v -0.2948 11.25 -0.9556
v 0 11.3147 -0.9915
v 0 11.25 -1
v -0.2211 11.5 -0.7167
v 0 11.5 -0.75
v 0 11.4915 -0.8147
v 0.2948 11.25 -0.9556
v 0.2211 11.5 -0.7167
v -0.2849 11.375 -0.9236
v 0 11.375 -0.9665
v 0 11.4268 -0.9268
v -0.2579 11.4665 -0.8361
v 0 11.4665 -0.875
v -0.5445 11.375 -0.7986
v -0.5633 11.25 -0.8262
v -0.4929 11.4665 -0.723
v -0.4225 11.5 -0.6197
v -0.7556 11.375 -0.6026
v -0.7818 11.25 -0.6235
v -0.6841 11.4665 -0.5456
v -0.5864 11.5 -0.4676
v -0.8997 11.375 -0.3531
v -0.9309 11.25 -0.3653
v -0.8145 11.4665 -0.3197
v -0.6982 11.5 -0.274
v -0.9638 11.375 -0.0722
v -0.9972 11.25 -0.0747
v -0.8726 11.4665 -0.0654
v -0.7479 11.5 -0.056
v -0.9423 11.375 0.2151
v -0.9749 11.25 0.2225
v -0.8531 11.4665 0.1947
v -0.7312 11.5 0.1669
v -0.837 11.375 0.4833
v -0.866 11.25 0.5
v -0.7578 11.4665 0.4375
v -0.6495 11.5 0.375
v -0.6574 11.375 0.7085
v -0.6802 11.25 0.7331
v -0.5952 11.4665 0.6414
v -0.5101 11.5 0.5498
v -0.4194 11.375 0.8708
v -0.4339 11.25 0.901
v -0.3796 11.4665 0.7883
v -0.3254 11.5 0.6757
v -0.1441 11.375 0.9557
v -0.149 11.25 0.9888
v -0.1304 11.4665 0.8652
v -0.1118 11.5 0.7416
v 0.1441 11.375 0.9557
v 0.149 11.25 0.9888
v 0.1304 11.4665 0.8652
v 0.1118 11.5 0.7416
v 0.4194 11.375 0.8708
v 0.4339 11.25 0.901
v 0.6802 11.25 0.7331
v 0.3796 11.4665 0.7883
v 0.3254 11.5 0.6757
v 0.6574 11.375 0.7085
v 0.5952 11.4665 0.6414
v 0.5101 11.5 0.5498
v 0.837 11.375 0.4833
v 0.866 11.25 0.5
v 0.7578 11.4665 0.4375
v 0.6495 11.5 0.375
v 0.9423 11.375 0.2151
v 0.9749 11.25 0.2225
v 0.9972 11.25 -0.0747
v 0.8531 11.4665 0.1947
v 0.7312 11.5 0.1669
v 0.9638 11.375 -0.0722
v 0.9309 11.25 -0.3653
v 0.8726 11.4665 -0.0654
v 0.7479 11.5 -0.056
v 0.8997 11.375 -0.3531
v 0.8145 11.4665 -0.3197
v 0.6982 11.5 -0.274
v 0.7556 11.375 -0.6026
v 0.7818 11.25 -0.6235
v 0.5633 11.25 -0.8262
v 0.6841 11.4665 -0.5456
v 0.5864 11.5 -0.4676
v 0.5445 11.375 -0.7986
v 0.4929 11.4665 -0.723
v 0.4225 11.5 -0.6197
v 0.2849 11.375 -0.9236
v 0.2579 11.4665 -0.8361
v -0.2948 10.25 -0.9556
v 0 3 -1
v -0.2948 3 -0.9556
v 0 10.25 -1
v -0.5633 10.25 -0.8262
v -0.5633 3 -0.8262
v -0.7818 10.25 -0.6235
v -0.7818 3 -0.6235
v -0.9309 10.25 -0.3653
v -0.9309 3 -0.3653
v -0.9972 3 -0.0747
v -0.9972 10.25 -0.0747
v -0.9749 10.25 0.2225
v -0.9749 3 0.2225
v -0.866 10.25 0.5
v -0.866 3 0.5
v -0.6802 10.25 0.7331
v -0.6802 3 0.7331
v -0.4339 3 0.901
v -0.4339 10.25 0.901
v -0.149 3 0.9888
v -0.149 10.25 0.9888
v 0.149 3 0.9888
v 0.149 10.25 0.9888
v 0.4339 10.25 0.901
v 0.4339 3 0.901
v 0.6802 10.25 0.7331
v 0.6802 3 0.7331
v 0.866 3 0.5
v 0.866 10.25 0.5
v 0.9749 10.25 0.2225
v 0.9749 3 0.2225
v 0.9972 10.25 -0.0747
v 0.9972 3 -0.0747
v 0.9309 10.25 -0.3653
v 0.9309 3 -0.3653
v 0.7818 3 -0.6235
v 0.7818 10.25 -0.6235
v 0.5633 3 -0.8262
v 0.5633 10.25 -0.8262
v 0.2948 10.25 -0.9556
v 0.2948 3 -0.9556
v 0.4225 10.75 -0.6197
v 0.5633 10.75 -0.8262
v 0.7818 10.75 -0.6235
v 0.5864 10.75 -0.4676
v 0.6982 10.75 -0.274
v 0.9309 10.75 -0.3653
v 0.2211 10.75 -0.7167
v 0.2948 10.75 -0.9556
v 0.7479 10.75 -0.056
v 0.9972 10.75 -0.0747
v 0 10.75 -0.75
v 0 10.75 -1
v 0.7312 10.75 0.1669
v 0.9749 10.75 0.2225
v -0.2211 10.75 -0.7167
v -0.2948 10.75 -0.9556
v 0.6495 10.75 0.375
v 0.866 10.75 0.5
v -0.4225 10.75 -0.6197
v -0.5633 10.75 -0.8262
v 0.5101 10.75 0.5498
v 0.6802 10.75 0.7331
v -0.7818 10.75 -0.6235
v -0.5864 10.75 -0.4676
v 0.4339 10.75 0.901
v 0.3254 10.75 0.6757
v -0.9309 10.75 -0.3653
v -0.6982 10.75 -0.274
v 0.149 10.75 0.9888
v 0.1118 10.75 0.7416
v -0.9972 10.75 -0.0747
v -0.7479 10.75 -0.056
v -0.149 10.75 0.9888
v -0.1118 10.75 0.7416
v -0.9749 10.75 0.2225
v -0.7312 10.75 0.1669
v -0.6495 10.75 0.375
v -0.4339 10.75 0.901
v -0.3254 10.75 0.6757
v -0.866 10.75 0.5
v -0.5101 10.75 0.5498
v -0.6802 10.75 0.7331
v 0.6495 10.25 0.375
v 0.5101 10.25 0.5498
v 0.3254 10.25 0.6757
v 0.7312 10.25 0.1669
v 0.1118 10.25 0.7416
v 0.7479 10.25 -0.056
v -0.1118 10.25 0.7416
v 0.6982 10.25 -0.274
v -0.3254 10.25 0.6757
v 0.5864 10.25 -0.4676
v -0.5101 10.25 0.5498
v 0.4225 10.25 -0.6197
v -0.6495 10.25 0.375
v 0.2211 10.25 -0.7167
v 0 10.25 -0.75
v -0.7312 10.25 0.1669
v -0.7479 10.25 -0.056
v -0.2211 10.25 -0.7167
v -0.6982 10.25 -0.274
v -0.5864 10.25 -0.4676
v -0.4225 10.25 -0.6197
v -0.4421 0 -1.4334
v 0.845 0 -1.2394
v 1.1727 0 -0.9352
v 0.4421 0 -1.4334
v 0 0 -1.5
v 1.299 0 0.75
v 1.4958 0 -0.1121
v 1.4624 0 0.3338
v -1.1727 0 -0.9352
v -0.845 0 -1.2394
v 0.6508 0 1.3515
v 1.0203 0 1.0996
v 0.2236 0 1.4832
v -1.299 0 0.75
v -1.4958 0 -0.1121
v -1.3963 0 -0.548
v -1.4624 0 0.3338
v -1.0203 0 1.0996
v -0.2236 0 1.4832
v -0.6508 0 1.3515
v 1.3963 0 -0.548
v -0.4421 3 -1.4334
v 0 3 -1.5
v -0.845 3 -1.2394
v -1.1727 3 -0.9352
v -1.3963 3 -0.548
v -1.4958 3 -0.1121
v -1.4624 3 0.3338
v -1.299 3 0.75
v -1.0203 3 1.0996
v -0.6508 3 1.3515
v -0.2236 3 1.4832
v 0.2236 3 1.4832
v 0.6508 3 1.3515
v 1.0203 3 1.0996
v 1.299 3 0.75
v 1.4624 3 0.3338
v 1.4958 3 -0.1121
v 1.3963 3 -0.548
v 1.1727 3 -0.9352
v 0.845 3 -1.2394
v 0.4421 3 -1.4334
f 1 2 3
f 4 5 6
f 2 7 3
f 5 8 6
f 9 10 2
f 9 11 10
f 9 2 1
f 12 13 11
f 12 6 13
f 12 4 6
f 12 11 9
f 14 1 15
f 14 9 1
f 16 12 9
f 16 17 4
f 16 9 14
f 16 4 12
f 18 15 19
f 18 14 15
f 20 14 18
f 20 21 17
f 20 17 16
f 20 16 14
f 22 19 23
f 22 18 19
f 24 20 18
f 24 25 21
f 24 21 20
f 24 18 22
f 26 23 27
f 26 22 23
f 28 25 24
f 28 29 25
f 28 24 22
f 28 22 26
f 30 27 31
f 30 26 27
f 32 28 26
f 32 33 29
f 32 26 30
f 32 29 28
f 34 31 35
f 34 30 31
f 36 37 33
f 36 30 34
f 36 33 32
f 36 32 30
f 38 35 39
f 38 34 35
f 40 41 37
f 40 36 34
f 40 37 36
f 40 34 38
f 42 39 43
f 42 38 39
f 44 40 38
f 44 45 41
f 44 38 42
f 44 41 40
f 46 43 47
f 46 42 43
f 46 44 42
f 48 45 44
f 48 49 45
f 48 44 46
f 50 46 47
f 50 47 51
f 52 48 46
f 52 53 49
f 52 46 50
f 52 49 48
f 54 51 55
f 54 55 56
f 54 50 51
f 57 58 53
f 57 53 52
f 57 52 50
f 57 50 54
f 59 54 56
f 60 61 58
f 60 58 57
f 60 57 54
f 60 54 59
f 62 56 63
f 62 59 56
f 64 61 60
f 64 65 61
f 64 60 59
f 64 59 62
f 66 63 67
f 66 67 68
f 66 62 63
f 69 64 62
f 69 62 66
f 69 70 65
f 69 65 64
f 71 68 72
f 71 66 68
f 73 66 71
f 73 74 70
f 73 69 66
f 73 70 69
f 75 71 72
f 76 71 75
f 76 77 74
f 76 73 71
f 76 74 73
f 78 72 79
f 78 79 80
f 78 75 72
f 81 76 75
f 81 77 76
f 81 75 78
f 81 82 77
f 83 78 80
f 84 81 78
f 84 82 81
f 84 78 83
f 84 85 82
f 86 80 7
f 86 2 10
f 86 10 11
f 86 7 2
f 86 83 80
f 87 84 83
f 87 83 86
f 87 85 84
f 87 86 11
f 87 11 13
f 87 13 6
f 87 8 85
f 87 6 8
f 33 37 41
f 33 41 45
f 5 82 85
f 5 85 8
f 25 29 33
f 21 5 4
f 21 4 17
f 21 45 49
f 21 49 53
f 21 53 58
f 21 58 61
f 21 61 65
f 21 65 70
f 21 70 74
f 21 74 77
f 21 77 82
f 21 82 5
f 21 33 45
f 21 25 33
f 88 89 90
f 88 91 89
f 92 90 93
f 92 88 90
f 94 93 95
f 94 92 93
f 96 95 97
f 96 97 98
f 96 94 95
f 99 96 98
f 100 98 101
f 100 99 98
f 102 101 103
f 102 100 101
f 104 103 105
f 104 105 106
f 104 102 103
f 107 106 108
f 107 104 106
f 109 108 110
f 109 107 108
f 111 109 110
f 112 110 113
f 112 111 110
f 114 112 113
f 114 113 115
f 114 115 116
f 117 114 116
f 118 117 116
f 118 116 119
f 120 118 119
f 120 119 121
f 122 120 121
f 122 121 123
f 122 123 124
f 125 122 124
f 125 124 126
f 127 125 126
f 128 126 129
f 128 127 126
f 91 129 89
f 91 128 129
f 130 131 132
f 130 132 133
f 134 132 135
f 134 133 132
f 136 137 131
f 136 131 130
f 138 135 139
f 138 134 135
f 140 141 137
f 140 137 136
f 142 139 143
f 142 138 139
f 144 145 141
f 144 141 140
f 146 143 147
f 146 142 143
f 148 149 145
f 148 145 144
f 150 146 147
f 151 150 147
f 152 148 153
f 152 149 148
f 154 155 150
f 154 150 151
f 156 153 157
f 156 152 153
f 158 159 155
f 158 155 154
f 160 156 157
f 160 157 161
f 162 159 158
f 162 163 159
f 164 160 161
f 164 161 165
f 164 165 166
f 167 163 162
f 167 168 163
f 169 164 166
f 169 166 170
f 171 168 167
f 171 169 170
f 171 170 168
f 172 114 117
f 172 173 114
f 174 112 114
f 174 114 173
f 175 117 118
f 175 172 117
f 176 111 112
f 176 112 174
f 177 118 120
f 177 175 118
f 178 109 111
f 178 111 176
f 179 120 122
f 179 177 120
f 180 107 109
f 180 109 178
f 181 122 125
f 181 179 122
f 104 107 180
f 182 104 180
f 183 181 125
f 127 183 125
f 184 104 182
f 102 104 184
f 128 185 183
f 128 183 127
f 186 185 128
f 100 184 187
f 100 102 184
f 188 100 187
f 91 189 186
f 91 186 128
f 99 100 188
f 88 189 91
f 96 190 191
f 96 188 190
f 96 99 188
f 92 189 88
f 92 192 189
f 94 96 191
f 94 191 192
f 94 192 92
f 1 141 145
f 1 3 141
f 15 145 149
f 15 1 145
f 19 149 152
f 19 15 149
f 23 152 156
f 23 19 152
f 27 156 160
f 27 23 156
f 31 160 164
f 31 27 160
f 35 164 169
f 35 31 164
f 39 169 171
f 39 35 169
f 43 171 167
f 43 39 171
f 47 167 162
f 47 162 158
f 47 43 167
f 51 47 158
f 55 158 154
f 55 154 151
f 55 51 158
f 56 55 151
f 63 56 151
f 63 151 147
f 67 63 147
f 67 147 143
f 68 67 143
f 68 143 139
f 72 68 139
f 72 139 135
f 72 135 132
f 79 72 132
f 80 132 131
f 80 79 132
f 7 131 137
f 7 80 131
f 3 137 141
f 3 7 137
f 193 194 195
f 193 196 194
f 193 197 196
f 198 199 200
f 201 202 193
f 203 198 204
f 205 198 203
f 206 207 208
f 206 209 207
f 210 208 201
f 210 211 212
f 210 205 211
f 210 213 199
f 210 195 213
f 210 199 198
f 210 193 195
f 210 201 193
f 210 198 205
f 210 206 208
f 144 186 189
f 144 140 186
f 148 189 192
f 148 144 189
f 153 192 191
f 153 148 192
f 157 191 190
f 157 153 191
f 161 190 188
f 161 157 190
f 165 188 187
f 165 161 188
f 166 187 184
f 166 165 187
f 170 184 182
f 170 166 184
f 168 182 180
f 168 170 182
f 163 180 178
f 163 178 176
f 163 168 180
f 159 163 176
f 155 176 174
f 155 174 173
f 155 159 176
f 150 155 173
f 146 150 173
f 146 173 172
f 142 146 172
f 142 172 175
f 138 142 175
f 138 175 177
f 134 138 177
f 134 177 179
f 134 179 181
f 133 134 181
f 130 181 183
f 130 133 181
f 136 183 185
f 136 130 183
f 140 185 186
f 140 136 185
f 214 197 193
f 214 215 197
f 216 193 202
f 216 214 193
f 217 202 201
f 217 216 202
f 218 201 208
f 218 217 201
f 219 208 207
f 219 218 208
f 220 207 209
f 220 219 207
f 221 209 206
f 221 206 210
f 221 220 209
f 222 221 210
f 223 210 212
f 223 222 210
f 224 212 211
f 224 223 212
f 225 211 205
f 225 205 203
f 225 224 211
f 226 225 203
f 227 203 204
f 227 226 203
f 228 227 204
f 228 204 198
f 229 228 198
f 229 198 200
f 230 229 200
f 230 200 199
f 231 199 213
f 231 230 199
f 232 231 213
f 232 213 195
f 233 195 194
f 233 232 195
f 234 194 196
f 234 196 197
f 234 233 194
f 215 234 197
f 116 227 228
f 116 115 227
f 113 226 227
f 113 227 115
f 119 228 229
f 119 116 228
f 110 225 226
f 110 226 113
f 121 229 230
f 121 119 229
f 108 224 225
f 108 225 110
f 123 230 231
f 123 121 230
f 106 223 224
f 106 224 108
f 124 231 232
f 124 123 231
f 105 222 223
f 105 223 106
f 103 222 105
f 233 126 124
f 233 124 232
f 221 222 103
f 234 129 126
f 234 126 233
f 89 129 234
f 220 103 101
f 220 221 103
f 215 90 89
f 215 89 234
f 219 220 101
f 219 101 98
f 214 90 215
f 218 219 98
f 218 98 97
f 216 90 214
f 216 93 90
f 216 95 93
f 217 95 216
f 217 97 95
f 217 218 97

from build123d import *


with BuildPart() as part:
    # Esquisse1 → Révolution1 (revolve)
    with BuildSketch(Plane.XY, mode=Mode.PRIVATE) as r_volution1_sk:
        with BuildLine():
            Line((0, 0), (1.5, 0))
            Line((1.5, 0), (1.5, 3))
            Line((1.5, 3), (1, 3))
            Line((1, 3), (1, 10.25))
            Line((1, 10.25), (0.75, 10.25))
            Line((0.75, 10.25), (0.75, 10.75))
            Line((0.75, 10.75), (1, 10.75))
            Line((1, 10.75), (1, 11.25))
            ThreePointArc((1, 11.25), (0.926776695, 11.426776695), (0.75, 11.5))
            Line((0.75, 11.5), (0, 11.5))
            Line((0, 11.5), (0, 0))
        make_face()
    revolve(r_volution1_sk.sketch.rotate(Axis((0, 0, 0), (0, 1, 0)), 90), axis=Axis((0, 0, 0), (0, 1, 0)))


solid = part.part
